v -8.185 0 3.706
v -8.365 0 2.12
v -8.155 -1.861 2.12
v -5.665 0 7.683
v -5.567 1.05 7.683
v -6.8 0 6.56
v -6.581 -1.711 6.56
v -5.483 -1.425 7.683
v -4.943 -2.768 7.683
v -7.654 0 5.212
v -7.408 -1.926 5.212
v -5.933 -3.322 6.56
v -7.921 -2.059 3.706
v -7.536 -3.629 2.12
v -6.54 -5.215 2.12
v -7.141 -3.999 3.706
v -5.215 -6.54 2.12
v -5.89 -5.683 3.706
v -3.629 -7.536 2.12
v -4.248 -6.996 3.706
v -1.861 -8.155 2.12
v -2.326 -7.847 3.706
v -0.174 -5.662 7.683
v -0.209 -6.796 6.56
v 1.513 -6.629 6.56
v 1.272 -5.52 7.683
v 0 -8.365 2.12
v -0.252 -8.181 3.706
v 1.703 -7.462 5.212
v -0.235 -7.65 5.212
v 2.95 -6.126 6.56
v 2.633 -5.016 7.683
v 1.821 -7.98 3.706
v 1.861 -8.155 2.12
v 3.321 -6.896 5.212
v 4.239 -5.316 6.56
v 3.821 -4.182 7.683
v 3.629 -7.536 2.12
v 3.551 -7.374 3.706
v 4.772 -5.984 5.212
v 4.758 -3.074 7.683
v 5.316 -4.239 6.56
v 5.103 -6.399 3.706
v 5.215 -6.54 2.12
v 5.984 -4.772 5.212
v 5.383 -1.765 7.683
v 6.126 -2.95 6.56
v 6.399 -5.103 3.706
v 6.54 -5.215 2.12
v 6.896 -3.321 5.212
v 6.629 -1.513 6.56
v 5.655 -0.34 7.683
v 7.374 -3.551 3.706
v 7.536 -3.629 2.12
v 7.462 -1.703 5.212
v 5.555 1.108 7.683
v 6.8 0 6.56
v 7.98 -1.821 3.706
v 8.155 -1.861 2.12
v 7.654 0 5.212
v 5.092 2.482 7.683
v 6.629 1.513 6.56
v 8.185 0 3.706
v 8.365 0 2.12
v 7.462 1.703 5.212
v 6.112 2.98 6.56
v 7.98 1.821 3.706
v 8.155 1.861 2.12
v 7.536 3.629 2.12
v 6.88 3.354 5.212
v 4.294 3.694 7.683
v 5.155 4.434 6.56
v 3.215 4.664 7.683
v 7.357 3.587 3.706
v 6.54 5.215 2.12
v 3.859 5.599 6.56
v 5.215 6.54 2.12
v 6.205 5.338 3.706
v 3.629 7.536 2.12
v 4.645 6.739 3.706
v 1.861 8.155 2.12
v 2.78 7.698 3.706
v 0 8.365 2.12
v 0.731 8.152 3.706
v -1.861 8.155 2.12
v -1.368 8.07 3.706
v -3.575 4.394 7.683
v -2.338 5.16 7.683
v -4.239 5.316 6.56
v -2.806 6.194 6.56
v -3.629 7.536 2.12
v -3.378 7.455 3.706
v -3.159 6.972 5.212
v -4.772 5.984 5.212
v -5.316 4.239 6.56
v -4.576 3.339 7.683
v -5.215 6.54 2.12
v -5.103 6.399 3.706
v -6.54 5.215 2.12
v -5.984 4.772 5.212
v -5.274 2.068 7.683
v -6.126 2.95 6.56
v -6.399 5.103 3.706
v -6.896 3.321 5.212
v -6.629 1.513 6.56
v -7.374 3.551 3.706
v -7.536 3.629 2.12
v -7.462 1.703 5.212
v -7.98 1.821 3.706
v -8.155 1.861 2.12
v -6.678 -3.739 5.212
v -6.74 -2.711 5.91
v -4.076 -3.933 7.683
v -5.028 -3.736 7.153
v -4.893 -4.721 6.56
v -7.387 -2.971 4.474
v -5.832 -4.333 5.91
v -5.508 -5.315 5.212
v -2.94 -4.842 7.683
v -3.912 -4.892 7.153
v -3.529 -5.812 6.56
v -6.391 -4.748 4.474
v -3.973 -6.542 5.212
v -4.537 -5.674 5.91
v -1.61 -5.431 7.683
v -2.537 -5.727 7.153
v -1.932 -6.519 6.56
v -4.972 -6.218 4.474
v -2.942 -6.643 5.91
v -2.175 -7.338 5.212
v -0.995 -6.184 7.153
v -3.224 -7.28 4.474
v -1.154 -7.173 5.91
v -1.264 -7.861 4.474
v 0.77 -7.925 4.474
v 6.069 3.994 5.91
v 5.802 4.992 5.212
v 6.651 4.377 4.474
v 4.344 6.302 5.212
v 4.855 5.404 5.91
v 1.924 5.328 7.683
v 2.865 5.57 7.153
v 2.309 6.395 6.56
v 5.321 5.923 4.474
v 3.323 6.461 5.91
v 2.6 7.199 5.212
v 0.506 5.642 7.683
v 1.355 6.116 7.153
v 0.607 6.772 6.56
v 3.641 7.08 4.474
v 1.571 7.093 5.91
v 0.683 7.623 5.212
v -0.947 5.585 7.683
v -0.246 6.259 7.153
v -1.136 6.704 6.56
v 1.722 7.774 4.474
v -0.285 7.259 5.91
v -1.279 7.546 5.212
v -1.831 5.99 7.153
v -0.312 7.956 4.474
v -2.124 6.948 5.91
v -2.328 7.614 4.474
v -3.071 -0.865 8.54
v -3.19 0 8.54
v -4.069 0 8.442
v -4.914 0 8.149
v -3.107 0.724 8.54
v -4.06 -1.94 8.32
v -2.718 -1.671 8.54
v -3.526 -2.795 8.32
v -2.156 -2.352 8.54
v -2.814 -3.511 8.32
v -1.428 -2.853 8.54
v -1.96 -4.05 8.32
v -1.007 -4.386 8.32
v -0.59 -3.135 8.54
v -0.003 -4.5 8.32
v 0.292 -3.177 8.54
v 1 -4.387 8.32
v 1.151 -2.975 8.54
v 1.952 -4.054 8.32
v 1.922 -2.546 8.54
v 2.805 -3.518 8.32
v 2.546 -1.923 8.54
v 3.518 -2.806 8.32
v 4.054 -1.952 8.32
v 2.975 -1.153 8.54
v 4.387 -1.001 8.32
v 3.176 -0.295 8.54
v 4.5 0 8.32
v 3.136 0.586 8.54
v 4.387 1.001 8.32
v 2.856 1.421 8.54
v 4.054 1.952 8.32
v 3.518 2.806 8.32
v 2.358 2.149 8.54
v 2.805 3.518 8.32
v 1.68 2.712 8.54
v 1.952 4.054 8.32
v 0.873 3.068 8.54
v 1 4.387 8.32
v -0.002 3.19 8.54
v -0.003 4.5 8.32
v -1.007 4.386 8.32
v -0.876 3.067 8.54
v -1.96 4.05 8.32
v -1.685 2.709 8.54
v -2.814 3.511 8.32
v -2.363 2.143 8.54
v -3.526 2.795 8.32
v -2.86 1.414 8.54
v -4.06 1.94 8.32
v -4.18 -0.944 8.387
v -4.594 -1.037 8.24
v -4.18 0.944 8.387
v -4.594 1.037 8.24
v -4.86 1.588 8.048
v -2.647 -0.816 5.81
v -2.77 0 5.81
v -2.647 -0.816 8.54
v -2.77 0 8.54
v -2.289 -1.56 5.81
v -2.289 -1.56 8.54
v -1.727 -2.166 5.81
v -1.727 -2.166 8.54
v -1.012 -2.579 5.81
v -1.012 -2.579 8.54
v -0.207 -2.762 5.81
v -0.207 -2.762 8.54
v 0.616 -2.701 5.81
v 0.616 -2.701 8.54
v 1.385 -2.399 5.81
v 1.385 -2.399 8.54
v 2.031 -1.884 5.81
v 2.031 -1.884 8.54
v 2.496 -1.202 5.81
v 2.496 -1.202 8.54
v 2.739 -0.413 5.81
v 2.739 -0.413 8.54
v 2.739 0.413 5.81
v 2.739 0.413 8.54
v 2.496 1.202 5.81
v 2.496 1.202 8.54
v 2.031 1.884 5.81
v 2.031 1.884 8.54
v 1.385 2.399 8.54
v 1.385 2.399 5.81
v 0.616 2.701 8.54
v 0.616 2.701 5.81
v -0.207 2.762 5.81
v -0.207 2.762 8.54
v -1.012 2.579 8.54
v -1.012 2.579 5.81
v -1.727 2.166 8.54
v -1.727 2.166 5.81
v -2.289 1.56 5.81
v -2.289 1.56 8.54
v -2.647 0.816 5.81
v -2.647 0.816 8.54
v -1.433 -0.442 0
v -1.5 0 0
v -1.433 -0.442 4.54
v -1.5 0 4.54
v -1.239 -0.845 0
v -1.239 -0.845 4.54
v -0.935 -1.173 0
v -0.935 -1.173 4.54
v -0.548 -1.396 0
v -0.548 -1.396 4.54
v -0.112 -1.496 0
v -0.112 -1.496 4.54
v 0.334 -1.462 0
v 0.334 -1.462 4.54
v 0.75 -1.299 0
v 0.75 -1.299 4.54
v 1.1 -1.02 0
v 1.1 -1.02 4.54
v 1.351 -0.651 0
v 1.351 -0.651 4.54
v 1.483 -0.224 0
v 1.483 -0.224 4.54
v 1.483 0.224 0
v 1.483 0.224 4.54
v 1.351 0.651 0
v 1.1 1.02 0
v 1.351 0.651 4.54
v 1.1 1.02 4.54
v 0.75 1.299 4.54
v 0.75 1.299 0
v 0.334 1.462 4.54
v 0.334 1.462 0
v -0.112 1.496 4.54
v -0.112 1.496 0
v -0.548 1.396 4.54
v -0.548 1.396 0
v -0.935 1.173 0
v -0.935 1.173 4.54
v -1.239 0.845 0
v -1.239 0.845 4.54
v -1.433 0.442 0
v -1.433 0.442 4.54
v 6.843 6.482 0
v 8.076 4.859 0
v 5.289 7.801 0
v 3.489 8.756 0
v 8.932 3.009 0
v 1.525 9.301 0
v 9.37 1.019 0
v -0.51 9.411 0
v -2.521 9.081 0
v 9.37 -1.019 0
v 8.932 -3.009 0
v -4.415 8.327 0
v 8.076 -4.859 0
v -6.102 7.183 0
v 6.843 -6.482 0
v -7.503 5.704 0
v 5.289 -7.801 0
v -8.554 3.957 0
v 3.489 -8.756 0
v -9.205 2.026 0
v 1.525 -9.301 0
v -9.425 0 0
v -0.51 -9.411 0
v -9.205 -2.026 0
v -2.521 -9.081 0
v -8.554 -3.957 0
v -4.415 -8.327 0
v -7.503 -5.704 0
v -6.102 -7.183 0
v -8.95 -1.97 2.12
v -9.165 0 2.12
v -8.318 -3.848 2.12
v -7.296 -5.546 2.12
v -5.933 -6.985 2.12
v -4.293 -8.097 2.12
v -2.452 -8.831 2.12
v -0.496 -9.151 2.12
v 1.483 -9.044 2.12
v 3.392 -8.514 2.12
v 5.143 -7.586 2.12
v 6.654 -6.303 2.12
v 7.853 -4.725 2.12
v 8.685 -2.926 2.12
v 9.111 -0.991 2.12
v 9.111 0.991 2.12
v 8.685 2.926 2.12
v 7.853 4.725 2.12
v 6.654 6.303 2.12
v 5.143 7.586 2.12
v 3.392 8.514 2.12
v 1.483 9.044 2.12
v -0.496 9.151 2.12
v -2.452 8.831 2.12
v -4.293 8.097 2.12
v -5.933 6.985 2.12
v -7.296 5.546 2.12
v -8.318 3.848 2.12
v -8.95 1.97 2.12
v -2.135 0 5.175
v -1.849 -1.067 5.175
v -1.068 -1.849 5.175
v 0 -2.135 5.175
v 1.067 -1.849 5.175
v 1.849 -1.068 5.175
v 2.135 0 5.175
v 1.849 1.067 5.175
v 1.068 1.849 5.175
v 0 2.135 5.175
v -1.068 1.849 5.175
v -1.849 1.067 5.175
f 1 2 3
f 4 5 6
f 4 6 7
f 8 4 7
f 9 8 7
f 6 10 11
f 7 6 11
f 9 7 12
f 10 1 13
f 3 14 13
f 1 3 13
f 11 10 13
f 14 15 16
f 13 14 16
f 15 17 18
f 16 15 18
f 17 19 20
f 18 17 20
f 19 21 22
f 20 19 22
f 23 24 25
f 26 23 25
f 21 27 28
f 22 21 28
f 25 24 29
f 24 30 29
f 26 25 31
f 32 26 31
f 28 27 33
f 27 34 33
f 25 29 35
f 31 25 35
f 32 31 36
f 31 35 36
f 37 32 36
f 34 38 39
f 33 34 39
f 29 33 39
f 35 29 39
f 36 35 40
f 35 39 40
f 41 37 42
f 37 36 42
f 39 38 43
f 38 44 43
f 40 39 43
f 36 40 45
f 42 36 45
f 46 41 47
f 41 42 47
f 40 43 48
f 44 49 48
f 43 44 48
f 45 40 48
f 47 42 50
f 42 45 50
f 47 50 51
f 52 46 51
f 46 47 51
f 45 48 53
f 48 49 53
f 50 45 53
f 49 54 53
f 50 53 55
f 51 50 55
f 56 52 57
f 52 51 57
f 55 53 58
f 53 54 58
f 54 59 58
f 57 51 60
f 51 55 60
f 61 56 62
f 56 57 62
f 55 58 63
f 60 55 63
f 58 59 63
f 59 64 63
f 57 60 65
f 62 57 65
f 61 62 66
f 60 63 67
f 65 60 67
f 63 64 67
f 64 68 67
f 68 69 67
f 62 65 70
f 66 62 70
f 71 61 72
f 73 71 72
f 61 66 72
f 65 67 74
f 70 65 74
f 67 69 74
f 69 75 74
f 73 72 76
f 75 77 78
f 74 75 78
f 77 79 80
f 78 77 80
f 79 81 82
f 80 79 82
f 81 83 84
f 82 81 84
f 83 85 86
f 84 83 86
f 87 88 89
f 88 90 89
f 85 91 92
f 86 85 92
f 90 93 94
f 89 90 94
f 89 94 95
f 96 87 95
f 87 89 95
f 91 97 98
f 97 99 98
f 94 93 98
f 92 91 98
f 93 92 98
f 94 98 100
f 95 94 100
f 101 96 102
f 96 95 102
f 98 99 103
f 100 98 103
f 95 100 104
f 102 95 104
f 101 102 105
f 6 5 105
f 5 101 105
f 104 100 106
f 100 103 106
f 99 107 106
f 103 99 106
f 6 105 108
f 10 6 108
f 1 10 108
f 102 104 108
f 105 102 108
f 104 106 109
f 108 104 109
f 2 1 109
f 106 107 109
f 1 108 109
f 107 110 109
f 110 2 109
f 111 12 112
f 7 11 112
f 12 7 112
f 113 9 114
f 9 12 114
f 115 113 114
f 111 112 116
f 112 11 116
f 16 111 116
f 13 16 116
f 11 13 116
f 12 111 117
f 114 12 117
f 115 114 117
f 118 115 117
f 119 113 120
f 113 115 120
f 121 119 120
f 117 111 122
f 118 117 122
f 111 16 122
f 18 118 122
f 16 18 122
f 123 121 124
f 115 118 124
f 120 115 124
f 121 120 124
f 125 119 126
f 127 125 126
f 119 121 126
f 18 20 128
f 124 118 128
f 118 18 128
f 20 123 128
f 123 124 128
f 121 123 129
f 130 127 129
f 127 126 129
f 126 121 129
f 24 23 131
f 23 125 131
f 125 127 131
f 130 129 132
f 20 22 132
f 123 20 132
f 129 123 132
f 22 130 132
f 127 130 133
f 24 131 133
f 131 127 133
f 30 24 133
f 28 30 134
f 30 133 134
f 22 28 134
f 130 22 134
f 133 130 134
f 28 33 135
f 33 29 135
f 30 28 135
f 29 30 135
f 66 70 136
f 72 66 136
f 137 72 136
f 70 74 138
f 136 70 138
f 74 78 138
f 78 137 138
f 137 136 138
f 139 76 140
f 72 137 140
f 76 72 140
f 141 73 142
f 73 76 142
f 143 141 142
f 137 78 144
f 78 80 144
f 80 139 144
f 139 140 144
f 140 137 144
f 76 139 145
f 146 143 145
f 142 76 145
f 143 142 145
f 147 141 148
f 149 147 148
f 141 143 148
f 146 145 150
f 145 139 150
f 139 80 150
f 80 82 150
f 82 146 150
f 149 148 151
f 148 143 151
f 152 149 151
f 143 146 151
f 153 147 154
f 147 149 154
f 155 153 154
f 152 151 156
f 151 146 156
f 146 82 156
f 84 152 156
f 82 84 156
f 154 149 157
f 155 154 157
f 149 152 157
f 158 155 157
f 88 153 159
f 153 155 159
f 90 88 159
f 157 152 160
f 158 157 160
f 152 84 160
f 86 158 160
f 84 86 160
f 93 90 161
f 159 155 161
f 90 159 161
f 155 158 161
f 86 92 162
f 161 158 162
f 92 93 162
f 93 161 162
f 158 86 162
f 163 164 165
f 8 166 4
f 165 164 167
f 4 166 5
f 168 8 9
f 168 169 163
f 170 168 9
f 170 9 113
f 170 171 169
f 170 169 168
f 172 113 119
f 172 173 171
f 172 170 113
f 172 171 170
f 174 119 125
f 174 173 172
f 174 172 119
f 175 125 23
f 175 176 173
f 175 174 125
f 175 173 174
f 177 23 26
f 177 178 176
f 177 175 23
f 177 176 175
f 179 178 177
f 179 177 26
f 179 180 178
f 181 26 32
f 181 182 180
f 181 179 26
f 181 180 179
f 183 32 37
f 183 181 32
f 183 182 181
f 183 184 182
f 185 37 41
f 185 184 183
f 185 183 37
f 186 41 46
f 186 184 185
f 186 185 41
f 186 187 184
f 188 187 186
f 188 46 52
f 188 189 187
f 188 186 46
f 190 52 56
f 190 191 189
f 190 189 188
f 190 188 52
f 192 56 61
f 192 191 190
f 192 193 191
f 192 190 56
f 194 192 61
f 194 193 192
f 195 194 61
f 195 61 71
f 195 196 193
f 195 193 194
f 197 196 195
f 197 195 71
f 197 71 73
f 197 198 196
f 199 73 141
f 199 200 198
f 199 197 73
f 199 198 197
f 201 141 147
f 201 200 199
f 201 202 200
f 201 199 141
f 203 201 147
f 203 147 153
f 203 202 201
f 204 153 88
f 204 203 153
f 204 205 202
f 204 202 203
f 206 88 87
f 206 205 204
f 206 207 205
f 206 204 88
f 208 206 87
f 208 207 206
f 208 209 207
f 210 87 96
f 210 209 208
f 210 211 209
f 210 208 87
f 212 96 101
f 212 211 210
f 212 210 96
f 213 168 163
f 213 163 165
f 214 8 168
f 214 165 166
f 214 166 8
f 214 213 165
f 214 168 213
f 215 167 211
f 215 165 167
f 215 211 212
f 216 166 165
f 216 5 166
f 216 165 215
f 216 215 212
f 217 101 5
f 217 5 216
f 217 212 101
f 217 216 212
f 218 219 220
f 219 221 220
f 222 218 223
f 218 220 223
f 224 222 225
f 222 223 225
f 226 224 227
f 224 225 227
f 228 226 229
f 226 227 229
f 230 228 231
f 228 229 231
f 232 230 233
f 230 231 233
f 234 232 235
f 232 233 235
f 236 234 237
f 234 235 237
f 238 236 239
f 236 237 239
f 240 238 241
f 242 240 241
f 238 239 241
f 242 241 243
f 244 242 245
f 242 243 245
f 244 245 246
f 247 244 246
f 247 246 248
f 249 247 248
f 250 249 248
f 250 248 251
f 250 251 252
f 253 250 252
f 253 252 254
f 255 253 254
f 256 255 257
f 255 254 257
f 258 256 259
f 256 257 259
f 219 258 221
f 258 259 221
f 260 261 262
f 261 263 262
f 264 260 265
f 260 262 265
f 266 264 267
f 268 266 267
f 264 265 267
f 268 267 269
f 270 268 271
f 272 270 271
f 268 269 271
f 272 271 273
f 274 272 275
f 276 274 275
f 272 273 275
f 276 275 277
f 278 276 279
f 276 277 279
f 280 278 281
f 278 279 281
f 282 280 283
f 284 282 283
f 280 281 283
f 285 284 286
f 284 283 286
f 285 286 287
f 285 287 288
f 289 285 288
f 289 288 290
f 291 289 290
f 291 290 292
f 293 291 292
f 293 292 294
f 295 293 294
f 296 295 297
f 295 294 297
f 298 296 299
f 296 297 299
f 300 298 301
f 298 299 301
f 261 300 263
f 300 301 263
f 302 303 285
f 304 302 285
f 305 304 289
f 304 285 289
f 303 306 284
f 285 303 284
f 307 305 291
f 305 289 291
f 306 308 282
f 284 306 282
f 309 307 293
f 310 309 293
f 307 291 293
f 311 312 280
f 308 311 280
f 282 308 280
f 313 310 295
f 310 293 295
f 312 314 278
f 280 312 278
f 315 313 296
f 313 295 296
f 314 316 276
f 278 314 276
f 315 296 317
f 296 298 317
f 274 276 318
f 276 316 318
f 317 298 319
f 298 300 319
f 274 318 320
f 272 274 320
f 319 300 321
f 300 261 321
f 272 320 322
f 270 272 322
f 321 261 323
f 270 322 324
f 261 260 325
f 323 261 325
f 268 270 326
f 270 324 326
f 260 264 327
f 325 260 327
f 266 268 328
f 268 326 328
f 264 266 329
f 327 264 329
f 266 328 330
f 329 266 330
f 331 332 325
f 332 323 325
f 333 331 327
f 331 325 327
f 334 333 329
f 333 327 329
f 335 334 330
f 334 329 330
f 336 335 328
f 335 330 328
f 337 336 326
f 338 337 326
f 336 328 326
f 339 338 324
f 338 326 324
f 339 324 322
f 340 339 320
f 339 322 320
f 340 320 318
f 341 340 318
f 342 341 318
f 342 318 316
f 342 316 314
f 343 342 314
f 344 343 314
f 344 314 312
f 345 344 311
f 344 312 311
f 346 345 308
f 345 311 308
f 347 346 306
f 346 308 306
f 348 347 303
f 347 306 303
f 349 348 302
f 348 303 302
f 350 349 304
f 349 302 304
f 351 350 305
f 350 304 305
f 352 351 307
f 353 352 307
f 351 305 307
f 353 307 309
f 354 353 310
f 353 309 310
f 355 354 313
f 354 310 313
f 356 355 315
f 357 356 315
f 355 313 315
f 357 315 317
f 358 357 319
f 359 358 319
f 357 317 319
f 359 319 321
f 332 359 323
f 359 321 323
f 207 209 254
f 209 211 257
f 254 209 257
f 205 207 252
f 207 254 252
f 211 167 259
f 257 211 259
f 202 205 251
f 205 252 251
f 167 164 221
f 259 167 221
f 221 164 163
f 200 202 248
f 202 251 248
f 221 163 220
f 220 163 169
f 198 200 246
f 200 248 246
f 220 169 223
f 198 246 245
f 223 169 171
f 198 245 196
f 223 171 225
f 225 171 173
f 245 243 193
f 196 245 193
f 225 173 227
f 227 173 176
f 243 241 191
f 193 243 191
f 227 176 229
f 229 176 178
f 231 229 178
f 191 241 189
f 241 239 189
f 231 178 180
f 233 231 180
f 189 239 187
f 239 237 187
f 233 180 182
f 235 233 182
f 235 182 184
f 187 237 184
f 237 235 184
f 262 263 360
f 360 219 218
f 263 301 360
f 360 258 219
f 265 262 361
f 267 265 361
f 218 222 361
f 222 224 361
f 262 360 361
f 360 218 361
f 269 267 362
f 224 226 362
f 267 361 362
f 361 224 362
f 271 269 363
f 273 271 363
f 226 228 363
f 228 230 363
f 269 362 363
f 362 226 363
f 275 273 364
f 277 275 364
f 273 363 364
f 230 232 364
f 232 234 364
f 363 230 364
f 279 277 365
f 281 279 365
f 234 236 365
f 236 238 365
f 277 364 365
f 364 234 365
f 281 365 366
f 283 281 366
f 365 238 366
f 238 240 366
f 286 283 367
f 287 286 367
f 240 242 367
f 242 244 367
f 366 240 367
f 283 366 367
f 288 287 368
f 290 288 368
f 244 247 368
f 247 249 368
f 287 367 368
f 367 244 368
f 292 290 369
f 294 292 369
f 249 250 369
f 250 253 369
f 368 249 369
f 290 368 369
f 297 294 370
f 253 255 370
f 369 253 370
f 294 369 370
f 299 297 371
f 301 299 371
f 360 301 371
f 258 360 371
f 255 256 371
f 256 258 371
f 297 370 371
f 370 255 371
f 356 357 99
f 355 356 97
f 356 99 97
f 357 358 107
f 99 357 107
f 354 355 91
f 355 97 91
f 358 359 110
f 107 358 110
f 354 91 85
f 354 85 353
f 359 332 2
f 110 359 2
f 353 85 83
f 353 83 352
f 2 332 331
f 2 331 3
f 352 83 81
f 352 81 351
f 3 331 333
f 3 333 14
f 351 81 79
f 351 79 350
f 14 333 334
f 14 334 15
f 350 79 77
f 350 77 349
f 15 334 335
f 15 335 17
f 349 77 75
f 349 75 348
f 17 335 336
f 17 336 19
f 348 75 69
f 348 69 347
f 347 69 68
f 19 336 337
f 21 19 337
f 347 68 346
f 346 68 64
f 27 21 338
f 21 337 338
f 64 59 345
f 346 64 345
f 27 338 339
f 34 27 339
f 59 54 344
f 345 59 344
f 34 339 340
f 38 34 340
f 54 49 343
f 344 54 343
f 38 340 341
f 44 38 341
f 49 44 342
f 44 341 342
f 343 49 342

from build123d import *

# Parameters (mm, degrees)
F2_R = 4


with BuildPart() as f1:
    # F0 (on Front) → F1 (revolve)
    with BuildSketch(Plane.XZ):
        with BuildLine():
            Line((-9.425, 0), (-1.5, 0))
            Line((-1.5, 0), (-1.5, 4.54))
            Line((-1.5, 4.54), (-2.77, 5.81))
            Line((-2.77, 5.81), (-2.77, 8.54))
            Line((-2.77, 8.54), (-4.27, 8.54))
            ThreePointArc((-4.27, 8.54), (-7.253886, 5.927327), (-8.364697, 2.12))
            Line((-8.364697, 2.12), (-9.164697, 2.12))
            Line((-9.164697, 2.12), (-9.425, 0))
        make_face()
    revolve(axis=Axis((0, 0, 4.049394), (0, 0, 1)))

    # F2
    f2_edges = [f1.edges().sort_by_distance(p)[0] for p in [
        (4.27, 0, 8.54),
    ]]
    fillet(f2_edges, radius=F2_R)


solid = f1.part
